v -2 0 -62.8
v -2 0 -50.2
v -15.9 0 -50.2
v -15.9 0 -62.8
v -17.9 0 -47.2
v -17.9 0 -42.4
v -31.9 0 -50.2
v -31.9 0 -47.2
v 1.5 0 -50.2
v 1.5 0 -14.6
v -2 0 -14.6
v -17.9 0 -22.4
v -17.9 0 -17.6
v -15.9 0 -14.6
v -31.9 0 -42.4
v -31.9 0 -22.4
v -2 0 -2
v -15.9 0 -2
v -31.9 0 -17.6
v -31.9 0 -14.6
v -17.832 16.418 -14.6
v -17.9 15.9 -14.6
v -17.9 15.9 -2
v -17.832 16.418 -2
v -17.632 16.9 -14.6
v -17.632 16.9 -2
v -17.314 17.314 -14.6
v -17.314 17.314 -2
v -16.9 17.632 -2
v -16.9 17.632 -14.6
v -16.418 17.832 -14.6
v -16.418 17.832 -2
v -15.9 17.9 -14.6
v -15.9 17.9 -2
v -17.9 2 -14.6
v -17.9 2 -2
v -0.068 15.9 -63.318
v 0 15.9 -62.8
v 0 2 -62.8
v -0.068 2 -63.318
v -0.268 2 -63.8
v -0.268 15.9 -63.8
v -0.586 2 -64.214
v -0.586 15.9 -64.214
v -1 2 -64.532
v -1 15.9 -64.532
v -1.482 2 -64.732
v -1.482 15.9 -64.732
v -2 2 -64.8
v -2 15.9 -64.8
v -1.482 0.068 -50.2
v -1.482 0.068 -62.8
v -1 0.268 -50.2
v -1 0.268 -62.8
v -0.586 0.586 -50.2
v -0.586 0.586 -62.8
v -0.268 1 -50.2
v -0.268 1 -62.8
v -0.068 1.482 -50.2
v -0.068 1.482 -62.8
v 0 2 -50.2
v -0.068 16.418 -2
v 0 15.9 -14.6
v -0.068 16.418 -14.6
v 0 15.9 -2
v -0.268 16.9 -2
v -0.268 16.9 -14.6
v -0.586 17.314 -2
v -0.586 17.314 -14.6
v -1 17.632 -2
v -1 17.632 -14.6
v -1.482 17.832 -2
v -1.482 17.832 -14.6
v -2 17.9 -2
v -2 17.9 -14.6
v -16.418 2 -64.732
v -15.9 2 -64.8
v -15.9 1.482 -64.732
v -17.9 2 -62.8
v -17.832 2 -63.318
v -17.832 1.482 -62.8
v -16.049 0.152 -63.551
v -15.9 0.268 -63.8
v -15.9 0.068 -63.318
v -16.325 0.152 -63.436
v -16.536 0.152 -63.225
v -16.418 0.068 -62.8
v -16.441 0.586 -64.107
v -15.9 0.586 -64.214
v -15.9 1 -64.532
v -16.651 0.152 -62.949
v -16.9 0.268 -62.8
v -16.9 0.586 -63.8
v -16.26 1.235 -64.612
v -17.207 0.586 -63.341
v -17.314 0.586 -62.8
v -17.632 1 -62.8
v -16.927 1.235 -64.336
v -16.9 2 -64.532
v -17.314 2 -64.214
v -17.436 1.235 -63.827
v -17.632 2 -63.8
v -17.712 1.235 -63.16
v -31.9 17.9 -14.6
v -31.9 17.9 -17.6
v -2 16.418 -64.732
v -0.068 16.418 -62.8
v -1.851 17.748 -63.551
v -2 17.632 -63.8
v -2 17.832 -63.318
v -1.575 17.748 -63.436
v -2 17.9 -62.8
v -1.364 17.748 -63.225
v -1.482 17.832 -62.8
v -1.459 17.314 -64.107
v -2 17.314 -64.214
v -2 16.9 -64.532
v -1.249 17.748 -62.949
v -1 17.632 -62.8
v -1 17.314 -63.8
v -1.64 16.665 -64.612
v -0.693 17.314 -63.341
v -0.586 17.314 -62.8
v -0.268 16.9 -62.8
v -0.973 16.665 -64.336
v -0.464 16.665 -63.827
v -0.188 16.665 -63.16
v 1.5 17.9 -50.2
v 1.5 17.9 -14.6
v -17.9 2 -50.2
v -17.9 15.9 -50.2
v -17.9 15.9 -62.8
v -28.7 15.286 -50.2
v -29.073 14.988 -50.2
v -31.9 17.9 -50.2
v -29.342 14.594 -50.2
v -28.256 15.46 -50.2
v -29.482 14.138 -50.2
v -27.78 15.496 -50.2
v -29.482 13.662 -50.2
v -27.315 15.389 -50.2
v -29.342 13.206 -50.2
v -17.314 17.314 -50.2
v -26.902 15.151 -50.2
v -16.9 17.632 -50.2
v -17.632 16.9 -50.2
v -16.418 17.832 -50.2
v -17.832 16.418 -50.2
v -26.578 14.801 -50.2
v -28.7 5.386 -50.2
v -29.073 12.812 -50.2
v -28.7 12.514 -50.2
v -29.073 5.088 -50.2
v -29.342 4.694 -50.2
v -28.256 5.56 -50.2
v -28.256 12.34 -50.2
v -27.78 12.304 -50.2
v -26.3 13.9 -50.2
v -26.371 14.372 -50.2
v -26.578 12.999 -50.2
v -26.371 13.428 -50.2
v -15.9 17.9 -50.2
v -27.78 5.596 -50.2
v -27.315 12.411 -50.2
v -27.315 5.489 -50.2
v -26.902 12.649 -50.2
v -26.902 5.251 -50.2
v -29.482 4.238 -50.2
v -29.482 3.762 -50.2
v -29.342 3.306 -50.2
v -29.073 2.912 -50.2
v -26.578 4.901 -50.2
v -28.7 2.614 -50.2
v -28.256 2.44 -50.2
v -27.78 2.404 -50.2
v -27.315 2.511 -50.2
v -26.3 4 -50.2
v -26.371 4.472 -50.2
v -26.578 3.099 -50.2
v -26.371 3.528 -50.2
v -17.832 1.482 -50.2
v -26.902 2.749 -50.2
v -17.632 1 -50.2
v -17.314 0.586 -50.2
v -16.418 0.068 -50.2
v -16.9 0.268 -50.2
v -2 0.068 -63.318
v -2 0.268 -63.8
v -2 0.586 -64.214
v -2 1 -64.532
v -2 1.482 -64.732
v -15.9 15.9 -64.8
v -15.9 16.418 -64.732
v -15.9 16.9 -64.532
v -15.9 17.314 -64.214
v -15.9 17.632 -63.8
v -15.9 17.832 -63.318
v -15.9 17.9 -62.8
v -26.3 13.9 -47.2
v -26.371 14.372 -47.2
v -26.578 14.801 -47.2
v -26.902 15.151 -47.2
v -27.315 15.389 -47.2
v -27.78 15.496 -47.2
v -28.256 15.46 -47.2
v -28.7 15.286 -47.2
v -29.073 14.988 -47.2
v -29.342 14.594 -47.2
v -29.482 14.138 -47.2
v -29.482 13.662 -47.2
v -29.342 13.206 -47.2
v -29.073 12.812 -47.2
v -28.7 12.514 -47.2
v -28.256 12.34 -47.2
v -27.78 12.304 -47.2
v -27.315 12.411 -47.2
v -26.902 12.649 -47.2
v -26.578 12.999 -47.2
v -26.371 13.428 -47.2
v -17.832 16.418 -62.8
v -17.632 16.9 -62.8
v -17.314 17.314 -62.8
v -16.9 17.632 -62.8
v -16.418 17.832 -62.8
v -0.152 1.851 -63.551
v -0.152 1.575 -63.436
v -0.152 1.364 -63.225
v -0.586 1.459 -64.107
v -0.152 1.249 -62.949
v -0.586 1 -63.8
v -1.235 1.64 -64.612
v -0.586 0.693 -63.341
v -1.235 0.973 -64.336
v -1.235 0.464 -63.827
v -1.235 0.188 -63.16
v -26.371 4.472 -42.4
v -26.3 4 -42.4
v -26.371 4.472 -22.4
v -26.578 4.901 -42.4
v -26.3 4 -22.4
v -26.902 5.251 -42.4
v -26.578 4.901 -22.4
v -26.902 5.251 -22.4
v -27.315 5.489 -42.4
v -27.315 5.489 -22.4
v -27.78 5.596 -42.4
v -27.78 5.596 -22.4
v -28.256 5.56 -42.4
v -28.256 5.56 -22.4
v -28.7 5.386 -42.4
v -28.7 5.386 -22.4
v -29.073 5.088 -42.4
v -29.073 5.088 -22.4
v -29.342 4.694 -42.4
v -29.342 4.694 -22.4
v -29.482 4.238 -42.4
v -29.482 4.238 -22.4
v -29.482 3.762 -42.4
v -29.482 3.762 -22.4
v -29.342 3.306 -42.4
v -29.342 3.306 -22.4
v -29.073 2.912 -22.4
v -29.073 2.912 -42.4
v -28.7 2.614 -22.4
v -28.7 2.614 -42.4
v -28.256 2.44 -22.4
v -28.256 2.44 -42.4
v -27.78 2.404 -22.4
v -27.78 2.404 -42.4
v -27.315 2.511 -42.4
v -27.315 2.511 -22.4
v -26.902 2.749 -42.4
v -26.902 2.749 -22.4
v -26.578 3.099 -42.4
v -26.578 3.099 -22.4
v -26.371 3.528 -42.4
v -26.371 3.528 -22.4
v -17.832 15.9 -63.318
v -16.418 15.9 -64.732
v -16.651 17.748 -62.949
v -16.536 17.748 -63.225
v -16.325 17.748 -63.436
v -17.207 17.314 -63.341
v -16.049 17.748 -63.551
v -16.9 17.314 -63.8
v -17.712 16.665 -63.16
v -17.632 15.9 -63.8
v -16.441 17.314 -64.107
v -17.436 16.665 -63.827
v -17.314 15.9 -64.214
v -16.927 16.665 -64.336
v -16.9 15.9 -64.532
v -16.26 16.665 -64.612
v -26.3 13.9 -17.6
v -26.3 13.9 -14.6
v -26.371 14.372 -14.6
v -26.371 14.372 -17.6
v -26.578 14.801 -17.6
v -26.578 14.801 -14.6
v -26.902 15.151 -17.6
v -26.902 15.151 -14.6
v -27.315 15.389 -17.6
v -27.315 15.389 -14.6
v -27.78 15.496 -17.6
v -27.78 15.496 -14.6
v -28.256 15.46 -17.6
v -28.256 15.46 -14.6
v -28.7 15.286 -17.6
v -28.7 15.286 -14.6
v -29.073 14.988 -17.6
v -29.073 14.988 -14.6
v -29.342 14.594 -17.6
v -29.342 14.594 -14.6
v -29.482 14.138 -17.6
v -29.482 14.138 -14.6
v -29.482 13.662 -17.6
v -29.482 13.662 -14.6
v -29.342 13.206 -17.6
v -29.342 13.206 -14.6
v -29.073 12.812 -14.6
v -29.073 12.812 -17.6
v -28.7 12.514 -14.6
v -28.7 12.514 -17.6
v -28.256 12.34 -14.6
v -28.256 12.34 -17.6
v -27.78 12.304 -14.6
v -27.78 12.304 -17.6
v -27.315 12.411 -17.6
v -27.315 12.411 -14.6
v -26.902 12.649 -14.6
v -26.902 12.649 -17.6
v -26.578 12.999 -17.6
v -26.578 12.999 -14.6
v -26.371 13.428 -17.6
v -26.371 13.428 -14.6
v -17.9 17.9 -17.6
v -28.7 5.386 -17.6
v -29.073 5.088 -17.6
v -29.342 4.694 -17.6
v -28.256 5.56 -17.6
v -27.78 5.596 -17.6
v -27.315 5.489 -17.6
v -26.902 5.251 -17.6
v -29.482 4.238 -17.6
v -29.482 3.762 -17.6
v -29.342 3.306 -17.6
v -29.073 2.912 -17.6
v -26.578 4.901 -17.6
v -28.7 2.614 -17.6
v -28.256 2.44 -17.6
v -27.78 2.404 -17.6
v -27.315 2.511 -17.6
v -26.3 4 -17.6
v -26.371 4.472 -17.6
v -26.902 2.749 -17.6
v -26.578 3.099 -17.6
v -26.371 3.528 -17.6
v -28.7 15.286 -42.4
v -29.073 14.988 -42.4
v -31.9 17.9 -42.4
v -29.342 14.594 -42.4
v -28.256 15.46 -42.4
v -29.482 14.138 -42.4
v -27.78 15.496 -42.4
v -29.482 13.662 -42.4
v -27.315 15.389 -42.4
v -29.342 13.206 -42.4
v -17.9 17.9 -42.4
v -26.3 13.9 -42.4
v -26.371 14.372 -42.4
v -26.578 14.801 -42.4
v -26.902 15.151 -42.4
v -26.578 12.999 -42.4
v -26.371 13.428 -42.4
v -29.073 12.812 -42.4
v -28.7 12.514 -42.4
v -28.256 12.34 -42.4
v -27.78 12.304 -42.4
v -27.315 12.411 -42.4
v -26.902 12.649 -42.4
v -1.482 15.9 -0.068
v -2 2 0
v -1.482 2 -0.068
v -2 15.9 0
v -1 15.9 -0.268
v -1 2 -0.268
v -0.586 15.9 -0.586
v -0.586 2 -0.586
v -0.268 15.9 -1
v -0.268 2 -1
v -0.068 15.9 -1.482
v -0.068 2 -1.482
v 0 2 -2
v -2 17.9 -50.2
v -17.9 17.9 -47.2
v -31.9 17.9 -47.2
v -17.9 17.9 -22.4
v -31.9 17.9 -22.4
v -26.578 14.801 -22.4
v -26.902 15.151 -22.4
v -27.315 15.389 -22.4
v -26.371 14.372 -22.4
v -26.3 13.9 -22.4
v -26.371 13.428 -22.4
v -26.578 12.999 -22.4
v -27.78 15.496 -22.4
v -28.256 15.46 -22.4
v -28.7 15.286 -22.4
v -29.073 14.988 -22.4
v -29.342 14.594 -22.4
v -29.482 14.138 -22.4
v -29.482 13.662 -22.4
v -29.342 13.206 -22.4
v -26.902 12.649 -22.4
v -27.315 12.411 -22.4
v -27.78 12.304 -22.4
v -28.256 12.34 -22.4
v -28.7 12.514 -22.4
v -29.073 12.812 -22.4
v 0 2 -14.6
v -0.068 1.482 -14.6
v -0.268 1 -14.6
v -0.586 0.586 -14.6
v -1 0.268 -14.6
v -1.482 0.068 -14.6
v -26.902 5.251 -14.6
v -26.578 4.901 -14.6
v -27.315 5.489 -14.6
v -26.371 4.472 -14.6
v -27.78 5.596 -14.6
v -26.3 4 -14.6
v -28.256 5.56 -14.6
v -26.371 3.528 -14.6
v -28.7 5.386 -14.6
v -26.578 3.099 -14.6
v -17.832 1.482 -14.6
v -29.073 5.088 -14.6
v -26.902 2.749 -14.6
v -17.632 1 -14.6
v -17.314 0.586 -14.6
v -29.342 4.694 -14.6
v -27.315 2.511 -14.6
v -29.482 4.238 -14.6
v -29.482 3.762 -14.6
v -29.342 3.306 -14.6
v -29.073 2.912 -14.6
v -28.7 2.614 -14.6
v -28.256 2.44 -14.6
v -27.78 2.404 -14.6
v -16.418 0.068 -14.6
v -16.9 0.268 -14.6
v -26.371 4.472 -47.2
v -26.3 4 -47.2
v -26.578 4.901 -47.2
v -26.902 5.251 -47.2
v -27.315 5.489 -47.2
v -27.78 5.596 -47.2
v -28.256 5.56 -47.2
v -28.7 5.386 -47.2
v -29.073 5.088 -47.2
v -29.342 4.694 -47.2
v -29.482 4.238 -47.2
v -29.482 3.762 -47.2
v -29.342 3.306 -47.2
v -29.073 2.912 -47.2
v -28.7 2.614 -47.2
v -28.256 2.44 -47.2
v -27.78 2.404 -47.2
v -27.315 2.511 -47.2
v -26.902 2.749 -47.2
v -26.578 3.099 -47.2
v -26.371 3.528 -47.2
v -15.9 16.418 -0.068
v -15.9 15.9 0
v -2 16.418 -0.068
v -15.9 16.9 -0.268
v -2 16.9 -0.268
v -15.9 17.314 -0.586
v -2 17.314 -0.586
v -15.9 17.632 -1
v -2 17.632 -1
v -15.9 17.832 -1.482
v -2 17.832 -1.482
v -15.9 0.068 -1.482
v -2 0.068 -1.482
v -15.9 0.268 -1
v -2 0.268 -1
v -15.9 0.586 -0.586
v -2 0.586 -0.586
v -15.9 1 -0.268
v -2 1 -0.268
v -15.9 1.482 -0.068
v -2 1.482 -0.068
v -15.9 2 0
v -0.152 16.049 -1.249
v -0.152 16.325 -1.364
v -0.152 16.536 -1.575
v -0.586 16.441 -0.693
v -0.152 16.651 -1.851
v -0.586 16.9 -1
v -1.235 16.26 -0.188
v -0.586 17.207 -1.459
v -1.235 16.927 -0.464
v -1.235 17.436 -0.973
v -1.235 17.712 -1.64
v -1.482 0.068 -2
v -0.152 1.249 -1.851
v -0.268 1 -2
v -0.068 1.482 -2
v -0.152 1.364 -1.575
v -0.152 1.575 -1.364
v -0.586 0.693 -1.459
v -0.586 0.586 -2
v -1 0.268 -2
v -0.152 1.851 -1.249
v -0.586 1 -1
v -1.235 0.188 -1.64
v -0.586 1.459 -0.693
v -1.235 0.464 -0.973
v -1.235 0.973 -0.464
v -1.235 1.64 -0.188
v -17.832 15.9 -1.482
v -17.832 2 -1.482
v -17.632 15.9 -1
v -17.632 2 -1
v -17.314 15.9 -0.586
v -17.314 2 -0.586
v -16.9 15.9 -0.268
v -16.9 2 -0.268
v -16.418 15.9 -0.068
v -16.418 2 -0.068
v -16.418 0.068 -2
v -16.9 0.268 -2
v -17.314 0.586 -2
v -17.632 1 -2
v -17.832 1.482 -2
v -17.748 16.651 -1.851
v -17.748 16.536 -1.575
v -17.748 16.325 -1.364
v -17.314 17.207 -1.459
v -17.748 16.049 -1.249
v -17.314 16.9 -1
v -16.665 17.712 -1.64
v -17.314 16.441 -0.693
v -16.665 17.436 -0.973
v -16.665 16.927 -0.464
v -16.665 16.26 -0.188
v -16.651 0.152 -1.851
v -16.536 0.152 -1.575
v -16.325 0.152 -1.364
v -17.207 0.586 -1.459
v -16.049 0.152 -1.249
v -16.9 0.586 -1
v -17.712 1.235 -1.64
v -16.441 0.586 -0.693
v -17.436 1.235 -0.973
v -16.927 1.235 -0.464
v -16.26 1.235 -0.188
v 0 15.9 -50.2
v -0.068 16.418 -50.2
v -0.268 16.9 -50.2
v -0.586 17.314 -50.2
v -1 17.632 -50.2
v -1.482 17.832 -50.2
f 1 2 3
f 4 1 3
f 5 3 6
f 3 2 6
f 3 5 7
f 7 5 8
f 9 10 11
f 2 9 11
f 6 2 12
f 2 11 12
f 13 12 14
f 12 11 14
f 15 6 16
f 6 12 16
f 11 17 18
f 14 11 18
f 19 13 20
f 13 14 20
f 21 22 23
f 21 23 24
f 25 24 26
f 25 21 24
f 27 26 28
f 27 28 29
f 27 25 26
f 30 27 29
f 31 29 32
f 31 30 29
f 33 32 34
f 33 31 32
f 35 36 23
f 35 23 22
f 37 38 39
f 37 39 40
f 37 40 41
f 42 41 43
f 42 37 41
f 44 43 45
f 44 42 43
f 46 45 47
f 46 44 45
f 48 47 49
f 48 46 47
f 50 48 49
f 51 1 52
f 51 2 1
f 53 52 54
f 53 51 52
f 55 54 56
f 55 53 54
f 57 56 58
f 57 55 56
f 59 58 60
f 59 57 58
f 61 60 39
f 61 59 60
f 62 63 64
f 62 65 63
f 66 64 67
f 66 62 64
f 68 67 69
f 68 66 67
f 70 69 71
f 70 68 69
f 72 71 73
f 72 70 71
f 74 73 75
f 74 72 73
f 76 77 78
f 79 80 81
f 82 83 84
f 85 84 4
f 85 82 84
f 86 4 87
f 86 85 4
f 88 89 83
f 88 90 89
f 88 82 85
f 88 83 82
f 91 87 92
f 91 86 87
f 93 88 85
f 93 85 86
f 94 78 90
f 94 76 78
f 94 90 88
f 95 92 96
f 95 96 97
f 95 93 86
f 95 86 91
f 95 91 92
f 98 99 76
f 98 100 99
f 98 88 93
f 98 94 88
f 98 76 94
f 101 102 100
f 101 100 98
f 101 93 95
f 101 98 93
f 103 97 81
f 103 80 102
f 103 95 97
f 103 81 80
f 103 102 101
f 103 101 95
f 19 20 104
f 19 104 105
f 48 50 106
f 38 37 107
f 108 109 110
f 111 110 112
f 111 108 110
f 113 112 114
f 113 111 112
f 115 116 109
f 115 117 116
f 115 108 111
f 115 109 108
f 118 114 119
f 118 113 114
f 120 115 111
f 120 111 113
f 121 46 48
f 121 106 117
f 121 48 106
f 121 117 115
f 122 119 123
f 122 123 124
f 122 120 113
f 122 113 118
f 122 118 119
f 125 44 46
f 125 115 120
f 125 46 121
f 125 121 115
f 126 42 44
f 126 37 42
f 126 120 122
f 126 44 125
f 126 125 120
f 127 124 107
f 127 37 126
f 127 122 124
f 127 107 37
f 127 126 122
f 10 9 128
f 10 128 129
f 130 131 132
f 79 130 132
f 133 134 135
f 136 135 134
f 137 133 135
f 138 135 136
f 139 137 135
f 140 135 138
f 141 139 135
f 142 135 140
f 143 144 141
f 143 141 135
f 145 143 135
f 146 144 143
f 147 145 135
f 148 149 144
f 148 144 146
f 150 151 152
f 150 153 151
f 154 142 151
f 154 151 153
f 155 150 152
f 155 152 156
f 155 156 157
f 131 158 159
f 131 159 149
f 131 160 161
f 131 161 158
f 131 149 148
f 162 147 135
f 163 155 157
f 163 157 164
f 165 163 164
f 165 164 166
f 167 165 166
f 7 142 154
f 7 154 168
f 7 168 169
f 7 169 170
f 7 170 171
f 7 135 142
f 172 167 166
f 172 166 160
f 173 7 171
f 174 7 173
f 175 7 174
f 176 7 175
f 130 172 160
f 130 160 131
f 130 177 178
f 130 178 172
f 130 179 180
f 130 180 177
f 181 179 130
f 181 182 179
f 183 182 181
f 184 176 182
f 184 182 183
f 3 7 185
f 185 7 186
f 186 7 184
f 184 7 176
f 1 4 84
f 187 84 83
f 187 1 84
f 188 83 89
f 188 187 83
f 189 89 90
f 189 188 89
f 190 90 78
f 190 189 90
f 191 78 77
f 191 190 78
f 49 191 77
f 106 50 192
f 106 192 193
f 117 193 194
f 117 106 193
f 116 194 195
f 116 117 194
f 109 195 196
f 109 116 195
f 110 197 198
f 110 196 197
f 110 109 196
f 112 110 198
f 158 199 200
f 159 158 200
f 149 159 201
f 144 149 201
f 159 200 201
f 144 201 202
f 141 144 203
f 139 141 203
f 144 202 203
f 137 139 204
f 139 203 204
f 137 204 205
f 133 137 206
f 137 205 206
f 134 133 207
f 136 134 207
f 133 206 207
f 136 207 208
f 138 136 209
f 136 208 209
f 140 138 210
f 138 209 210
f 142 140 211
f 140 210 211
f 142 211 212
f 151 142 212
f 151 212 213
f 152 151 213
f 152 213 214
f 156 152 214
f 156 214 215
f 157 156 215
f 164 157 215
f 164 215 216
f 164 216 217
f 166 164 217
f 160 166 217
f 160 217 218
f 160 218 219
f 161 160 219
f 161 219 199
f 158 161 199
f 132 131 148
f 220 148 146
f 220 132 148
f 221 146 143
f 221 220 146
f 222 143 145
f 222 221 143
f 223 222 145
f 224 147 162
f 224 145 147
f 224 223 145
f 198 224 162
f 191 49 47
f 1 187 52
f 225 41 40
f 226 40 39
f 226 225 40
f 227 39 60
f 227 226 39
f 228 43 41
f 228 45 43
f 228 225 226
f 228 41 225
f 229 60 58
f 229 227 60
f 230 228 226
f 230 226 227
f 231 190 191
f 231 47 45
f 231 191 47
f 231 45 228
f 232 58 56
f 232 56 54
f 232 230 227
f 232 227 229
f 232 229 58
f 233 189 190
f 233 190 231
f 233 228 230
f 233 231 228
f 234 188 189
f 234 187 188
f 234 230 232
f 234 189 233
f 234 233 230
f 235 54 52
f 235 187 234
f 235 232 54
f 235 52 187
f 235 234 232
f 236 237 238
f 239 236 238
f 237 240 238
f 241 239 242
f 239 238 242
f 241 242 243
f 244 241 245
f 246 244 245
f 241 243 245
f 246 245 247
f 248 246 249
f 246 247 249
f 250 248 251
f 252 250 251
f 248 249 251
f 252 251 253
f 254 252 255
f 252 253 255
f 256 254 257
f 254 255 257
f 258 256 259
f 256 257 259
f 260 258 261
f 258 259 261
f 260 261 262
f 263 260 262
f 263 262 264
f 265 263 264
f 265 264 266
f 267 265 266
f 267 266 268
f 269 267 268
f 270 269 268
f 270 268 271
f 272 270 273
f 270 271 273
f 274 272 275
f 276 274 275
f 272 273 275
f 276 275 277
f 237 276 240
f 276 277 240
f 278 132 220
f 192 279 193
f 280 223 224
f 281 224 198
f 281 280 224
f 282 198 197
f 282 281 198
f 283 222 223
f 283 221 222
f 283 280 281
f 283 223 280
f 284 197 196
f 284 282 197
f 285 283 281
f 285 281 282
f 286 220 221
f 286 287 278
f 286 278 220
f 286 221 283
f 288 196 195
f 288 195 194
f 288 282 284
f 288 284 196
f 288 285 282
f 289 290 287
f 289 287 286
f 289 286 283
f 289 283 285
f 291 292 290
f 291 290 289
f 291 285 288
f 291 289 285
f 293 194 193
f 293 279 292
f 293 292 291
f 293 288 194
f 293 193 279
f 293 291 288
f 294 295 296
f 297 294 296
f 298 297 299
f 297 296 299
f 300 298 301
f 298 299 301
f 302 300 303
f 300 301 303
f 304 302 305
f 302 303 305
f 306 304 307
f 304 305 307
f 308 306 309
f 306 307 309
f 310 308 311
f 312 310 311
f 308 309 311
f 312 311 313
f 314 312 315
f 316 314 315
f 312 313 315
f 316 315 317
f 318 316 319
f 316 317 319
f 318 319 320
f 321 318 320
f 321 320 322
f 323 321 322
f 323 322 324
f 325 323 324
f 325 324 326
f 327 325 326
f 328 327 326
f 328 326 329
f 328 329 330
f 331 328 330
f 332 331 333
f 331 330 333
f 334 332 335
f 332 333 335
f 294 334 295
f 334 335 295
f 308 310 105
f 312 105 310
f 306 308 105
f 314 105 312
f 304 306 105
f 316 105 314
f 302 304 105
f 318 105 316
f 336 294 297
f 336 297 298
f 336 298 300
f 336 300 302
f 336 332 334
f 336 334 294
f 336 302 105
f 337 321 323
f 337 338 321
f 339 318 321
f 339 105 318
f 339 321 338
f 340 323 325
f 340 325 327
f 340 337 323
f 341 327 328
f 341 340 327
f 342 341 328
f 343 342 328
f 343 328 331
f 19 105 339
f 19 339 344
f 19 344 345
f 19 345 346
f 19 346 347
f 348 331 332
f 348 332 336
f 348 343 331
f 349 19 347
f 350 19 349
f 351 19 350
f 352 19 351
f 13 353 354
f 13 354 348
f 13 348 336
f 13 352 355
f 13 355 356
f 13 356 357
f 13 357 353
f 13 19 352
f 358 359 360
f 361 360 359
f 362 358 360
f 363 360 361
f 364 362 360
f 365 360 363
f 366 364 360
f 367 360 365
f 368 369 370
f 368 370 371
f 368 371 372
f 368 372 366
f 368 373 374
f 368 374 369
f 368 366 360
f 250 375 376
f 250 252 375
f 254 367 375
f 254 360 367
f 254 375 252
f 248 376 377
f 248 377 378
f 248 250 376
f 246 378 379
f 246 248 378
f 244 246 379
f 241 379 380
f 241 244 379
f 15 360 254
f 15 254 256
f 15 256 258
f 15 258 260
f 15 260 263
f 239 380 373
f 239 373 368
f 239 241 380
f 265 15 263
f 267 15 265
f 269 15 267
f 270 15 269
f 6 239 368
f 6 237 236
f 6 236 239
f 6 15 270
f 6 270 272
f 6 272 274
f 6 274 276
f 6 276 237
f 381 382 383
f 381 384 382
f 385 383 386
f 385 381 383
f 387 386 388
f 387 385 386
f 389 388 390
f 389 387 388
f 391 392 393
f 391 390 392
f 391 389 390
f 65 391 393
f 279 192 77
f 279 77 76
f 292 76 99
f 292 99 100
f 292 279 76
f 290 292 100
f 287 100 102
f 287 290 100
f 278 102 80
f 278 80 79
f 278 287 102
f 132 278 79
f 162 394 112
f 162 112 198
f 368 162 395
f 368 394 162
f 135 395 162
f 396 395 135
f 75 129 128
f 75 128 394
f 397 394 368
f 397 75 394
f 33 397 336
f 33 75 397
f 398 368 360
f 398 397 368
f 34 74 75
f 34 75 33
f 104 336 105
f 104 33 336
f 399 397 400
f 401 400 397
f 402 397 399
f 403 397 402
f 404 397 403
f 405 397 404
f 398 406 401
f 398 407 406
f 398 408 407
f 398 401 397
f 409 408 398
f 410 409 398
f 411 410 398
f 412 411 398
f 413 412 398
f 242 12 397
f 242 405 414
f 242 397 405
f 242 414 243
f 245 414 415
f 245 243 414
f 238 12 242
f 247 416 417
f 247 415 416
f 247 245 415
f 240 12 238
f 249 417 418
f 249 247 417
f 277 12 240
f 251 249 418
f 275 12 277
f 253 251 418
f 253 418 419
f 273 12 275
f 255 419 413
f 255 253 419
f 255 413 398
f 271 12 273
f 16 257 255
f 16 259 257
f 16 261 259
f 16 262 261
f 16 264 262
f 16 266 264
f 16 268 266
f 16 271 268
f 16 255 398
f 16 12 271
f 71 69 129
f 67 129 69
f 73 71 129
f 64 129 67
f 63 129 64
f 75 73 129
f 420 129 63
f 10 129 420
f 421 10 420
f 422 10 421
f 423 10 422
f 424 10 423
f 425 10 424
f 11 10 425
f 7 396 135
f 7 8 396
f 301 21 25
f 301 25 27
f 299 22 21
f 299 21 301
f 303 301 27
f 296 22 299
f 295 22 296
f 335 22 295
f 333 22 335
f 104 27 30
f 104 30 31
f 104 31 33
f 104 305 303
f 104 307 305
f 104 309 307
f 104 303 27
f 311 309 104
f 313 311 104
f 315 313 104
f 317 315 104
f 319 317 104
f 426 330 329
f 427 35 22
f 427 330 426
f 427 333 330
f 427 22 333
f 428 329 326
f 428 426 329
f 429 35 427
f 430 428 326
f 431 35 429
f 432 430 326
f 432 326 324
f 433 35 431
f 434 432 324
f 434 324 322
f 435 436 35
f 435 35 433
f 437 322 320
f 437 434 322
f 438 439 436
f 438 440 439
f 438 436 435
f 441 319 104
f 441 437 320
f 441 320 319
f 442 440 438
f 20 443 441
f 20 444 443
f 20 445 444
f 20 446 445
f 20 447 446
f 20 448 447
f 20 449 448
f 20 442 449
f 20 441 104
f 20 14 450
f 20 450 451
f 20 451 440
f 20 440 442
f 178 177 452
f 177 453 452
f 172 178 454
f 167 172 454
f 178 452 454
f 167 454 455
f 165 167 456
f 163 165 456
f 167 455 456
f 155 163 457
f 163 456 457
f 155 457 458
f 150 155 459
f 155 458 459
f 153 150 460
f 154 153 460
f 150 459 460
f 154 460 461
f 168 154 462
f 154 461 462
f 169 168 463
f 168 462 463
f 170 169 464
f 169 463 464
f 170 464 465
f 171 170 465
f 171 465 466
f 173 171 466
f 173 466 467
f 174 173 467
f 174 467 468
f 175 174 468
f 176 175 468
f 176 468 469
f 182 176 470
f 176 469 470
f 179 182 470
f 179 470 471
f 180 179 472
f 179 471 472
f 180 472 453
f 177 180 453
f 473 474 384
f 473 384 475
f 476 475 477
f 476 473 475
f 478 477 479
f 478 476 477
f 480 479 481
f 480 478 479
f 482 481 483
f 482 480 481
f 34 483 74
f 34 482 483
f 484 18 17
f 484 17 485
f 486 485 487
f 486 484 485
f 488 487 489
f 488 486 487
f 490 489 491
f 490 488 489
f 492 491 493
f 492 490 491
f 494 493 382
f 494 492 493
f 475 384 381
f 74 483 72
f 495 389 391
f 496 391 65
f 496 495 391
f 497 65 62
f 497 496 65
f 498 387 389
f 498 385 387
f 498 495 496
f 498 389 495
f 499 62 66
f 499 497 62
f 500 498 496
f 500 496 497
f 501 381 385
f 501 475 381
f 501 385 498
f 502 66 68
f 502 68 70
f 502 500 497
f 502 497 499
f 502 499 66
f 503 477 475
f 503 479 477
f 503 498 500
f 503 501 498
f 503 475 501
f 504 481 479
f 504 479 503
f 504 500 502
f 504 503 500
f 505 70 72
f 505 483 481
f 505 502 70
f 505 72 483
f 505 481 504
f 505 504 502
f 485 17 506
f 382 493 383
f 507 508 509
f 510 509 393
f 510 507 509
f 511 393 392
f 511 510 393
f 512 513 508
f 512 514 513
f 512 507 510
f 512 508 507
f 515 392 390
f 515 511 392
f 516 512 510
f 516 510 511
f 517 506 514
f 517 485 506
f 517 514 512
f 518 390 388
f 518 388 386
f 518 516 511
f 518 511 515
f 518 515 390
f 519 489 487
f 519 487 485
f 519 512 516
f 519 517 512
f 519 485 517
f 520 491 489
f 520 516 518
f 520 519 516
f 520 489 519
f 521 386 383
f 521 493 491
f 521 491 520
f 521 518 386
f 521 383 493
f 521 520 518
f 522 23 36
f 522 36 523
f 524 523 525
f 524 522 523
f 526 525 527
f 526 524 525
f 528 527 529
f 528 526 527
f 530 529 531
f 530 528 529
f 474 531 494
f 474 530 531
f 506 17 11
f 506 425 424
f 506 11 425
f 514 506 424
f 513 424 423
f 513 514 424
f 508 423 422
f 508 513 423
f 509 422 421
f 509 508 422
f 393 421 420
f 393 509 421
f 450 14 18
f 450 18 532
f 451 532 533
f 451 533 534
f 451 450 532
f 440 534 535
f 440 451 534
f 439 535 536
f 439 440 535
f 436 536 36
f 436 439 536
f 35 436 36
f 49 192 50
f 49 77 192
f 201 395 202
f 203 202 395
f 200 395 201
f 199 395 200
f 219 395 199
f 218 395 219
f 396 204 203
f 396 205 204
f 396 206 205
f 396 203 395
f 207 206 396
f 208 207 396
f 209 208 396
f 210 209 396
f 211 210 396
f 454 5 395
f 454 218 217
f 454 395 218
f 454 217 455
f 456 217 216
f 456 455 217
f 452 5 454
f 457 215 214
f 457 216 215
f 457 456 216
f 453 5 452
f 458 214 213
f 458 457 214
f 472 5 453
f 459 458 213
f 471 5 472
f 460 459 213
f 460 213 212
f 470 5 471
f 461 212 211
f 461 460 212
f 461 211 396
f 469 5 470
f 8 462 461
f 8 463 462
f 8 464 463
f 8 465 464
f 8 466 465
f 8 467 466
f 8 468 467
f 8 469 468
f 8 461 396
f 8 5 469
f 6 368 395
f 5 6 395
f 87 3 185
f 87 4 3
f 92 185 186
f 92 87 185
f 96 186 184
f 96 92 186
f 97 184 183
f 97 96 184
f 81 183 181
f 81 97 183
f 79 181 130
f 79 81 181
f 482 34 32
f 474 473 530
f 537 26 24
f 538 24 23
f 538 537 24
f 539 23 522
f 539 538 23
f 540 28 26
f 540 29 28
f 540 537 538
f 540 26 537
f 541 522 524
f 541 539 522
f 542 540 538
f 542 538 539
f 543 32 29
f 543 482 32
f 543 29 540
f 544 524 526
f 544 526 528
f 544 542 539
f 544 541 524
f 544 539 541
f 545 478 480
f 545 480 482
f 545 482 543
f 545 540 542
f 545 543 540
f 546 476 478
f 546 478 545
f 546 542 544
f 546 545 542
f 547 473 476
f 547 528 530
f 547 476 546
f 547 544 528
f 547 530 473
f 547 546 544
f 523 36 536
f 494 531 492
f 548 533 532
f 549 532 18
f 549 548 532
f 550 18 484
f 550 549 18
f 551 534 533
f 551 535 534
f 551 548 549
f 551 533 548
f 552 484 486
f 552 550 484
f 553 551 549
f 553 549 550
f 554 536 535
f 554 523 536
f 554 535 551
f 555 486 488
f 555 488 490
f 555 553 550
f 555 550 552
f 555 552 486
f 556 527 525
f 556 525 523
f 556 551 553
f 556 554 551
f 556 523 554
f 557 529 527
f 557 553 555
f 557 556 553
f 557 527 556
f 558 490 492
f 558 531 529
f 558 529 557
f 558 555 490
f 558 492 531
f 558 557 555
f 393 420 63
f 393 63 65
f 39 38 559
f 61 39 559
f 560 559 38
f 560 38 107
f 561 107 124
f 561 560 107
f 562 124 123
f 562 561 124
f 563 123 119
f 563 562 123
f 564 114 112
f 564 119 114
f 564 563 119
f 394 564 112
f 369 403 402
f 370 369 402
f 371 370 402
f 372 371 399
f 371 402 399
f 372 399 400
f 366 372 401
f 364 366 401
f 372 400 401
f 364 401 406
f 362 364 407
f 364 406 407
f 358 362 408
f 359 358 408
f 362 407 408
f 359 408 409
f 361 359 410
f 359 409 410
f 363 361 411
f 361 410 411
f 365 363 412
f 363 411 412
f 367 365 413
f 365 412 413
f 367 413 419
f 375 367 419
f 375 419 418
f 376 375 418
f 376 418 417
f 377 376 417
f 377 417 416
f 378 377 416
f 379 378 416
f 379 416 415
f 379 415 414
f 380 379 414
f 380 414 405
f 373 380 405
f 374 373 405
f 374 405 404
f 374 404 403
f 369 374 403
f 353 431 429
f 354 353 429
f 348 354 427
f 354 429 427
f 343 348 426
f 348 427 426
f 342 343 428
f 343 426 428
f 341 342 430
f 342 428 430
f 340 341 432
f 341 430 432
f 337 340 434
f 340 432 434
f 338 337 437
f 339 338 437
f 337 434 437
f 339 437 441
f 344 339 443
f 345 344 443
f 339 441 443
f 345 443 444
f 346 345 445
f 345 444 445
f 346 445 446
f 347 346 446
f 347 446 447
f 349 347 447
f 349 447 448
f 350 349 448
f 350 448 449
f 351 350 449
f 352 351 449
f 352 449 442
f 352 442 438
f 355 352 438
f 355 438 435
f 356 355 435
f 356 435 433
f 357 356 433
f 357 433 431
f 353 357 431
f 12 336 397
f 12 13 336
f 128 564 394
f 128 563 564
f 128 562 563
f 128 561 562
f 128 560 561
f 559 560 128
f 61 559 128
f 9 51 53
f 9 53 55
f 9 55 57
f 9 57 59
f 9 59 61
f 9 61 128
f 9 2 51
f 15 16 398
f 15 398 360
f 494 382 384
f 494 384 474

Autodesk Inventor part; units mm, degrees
ref_plane "YZ Plane" through (0, 0, 0) normal (1, 0, 0) x (0, 1, 0)
ref_plane "XZ Plane" through (0, 0, 0) normal (0, 1, 0) x (-1, 0, 0)
ref_plane "XY Plane" through (0, 0, 0) normal (0, 0, 1) x (1, 0, 0)
sketch "Sketch1" plane through (0, 0, 0) normal (0, 1, 0) x (-1, 0, 0)
  line L0 (0, 0) -> (17.9, 0)
  line L1 (17.9, 0) -> (17.9, -64.8)
  line L2 (17.9, -64.8) -> (0, -64.8)
  line L3 (0, -64.8) -> (0, 0)
  line L4 (17.9, -14.6) -> (31.9, -14.6)
  line L5 (31.9, -14.6) -> (31.9, -17.6)
  line L6 (31.9, -17.6) -> (17.9, -17.6)
  line L7 (17.9, -17.6) -> (17.9, -14.6)
  line L8 (17.9, -22.4) -> (31.9, -22.4)
  line L9 (31.9, -22.4) -> (31.9, -42.4)
  line L10 (31.9, -42.4) -> (17.9, -42.4)
  line L11 (17.9, -42.4) -> (17.9, -22.4)
  line L12 (17.9, -47.2) -> (31.9, -47.2)
  line L13 (31.9, -47.2) -> (31.9, -50.2)
  line L14 (31.9, -50.2) -> (17.9, -50.2)
  line L15 (17.9, -50.2) -> (17.9, -47.2)
  line L16 (47.989, -20) -> (-6.1915, -20) construction
  line L17 (47.989, -44.8) -> (-4.845, -44.8) construction
  line L18 (0, -50.2) -> (-1.5, -50.2)
  line L19 (-1.5, -50.2) -> (-1.5, -14.6)
  line L20 (-1.5, -14.6) -> (0, -14.6)
  line L21 (0, -14.6) -> (0, -50.2)
  point P0 (17.9, -42.4)
  point P1 (0, -14.6)
  dimension "d0" = 17.9
  dimension "d2" = 3
  dimension "d4" = 20
  dimension "d5" = 24.8
  dimension "d6" = 2.4
  dimension "d7" = 2.4
  dimension "d8" = 2.4
  dimension "d9" = 2.4
  dimension "d10" = 3
  dimension "d11" = 14
  dimension "d14" = 20
  dimension "d24" = 1.5
extrude "Extrusion1" add sketch "Sketch1" along normal blind 17.9
fillet "Fillet1" radius 2 16 edges at (-17.9, 8.95, -64.8) (-8.95, 0, -64.8) (0, 8.95, -64.8) (-8.95, 17.9, -64.8) (-8.95, 17.9, 0) (-17.9, 8.95, 0) (-8.95, 0, 0) (0, 8.95, 0) (0, 17.9, -7.3) (0, 17.9, -57.5) (0, 0, -7.3) (0, 0, -57.5) (-17.9, 17.9, -57.5) (-17.9, 0, -57.5) (-17.9, 17.9, -7.3) (-17.9, 0, -7.3)
sketch "Sketch2" plane through (-31.9, 0, -14.6) normal (0, 0, 1) x (1, 0, 0)
  circle A0 centre (4, 13.9) radius 1.6
  circle A1 centre (4, 4) radius 1.6
  line L0 (14, 15.9) -> (14, 2) projected
  line L1 (0, 0) -> (16, 0) projected
  line L2 (0, 17.9) -> (16, 17.9) projected
  point P0 (31.9, 0)
  point P1 (14, 17.8)
  point P2 (14, 0)
  point P3 (12, 0)
  point P4 (12, 17.8)
  point P5 (12.5359, 0)
  point P6 (12.5359, 17.8)
  point P7 (16, 17.9)
  dimension "d16" = 3.2
  dimension "d17" = 3.2
  dimension "d18" = 10
  dimension "d19" = 10
  dimension "d20" = 4
  dimension "d21" = 4
extrude "Extrusion2" cut sketch "Sketch2" against normal blind 100
ref_plane "Work Plane1" through (0, 8.95, 0) normal (0, 1, 0) x (1, 0, 0)
equation "\"d7\" = d6"
equation "\"d8\" = d6"
equation "\"d9\" = d6"
equation "\"d19\" = d18"
properties part number "Square_tube_connector"
